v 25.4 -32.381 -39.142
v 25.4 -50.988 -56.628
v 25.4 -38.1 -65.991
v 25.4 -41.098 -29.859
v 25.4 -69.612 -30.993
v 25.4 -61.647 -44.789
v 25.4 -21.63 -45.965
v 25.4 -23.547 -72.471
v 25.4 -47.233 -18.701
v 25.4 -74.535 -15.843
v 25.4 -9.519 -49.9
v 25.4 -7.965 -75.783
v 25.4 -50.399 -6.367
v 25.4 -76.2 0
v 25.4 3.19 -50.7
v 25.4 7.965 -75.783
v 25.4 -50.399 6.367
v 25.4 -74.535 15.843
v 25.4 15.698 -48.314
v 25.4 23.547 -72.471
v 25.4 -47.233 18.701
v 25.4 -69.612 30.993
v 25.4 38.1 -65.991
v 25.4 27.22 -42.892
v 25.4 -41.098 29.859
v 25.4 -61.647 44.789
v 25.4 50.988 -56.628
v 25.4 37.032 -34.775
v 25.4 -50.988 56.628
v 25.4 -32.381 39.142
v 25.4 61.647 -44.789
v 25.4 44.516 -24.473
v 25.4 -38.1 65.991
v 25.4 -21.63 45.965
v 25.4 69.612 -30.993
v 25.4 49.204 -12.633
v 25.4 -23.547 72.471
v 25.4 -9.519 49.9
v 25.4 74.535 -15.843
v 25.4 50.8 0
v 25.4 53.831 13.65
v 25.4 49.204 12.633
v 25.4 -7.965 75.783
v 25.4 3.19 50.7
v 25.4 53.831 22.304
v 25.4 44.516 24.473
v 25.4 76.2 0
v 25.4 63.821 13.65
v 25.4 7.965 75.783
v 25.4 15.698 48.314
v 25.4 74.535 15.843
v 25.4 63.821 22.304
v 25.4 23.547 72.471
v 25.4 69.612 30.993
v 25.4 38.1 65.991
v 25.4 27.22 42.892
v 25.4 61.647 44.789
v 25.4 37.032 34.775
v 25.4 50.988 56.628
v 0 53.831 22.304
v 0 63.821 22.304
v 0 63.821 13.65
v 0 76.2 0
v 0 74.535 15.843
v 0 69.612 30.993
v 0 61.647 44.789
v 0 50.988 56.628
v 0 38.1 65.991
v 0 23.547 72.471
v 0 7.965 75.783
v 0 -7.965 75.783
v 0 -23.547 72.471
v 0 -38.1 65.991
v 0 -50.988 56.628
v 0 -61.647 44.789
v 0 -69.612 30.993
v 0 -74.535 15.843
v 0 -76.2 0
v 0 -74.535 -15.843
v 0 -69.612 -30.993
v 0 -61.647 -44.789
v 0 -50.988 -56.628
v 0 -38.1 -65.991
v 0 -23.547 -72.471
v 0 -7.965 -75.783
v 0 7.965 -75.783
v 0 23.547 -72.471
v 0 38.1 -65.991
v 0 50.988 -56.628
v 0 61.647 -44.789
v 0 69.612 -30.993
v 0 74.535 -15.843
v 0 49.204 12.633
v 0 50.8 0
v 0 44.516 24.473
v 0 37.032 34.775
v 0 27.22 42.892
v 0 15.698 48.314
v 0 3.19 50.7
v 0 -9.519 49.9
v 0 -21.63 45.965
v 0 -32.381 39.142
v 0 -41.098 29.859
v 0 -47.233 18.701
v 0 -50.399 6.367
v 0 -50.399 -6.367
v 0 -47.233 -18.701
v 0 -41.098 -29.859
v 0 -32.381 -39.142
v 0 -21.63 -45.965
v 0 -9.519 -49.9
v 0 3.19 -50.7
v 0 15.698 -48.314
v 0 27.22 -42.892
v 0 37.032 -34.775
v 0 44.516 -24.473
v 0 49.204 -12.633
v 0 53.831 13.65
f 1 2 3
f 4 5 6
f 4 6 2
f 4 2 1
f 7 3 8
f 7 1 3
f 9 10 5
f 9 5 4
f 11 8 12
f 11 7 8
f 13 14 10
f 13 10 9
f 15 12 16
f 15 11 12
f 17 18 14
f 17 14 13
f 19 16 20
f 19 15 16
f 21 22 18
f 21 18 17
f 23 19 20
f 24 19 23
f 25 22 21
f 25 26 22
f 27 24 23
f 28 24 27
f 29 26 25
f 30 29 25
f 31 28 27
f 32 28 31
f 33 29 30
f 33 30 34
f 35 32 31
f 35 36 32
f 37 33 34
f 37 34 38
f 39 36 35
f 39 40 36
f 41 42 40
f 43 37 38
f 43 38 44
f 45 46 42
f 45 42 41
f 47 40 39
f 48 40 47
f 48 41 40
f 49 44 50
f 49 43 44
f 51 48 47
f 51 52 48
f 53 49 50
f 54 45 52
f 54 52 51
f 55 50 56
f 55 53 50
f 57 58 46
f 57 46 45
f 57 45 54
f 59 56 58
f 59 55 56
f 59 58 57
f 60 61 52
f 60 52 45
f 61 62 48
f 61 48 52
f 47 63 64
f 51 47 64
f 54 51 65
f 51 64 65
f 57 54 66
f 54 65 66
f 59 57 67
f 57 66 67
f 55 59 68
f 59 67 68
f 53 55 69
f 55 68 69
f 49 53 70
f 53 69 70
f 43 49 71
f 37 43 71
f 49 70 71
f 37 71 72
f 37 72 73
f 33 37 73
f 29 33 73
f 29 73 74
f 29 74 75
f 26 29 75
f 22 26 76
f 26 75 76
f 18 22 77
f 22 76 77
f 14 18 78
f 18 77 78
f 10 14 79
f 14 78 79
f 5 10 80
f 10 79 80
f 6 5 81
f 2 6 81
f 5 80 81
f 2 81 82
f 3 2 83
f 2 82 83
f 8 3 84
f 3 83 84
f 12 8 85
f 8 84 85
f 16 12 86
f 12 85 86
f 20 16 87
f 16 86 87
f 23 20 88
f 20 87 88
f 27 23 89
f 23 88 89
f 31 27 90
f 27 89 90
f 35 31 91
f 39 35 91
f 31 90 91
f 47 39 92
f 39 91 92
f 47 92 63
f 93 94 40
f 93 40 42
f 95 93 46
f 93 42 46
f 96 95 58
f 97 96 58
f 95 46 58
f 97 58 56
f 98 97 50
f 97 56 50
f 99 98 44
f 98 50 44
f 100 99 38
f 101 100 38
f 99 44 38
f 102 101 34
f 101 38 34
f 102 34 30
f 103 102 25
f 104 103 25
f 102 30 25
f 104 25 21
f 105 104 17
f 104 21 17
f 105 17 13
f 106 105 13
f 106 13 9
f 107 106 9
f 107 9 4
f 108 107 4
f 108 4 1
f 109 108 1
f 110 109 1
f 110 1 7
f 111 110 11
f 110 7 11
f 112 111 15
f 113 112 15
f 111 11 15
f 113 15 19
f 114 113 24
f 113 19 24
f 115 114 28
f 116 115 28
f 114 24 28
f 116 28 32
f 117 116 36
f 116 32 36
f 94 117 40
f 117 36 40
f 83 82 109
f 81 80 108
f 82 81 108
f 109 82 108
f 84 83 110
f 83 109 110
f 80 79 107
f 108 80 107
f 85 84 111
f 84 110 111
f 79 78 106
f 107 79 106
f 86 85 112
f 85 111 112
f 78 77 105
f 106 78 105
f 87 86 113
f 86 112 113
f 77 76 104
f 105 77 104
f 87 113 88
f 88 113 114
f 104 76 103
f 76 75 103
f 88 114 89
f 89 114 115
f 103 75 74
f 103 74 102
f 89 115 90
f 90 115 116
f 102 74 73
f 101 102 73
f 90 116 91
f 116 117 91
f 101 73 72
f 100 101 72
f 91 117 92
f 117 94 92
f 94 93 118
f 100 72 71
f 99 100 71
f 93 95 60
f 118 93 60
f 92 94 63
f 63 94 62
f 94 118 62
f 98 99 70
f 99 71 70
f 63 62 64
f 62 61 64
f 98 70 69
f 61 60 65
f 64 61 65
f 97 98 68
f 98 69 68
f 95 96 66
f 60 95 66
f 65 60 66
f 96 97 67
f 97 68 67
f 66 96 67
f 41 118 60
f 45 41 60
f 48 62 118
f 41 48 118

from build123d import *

# Parameters (mm, degrees)
F0_R     = 76.2
F1_DEPTH = 25.4
F2_R     = 50.8
F3_DEPTH = 25.4
F4_W     = 9.9899098277
F4_H     = 8.6538987234
F5_DEPTH = 25.4


# Not quite as in the source:
# - a feature names something its author has since deleted; it is built from what else it names


with BuildPart() as f1:
    # F0 (on Right) → F1 (new body)
    with BuildSketch(Plane.YZ):
        Circle(F0_R)
    extrude(amount=F1_DEPTH)

    # F2 (on face) → F3 (cut)
    with BuildSketch(Plane.YZ.offset(25.4)):
        Circle(F2_R)
    extrude(amount=-F3_DEPTH, mode=Mode.SUBTRACT)

    # F4 (on face) → F5 (cut)
    with BuildSketch(Plane(origin=(0, 0, 0), x_dir=(0, -1, 0), z_dir=(-1, 0, 0))):
        with Locations((-58.8261894882, 17.9770062678)):
            Rectangle(F4_W, F4_H)
    extrude(amount=-F5_DEPTH, mode=Mode.SUBTRACT)


solid = f1.part
